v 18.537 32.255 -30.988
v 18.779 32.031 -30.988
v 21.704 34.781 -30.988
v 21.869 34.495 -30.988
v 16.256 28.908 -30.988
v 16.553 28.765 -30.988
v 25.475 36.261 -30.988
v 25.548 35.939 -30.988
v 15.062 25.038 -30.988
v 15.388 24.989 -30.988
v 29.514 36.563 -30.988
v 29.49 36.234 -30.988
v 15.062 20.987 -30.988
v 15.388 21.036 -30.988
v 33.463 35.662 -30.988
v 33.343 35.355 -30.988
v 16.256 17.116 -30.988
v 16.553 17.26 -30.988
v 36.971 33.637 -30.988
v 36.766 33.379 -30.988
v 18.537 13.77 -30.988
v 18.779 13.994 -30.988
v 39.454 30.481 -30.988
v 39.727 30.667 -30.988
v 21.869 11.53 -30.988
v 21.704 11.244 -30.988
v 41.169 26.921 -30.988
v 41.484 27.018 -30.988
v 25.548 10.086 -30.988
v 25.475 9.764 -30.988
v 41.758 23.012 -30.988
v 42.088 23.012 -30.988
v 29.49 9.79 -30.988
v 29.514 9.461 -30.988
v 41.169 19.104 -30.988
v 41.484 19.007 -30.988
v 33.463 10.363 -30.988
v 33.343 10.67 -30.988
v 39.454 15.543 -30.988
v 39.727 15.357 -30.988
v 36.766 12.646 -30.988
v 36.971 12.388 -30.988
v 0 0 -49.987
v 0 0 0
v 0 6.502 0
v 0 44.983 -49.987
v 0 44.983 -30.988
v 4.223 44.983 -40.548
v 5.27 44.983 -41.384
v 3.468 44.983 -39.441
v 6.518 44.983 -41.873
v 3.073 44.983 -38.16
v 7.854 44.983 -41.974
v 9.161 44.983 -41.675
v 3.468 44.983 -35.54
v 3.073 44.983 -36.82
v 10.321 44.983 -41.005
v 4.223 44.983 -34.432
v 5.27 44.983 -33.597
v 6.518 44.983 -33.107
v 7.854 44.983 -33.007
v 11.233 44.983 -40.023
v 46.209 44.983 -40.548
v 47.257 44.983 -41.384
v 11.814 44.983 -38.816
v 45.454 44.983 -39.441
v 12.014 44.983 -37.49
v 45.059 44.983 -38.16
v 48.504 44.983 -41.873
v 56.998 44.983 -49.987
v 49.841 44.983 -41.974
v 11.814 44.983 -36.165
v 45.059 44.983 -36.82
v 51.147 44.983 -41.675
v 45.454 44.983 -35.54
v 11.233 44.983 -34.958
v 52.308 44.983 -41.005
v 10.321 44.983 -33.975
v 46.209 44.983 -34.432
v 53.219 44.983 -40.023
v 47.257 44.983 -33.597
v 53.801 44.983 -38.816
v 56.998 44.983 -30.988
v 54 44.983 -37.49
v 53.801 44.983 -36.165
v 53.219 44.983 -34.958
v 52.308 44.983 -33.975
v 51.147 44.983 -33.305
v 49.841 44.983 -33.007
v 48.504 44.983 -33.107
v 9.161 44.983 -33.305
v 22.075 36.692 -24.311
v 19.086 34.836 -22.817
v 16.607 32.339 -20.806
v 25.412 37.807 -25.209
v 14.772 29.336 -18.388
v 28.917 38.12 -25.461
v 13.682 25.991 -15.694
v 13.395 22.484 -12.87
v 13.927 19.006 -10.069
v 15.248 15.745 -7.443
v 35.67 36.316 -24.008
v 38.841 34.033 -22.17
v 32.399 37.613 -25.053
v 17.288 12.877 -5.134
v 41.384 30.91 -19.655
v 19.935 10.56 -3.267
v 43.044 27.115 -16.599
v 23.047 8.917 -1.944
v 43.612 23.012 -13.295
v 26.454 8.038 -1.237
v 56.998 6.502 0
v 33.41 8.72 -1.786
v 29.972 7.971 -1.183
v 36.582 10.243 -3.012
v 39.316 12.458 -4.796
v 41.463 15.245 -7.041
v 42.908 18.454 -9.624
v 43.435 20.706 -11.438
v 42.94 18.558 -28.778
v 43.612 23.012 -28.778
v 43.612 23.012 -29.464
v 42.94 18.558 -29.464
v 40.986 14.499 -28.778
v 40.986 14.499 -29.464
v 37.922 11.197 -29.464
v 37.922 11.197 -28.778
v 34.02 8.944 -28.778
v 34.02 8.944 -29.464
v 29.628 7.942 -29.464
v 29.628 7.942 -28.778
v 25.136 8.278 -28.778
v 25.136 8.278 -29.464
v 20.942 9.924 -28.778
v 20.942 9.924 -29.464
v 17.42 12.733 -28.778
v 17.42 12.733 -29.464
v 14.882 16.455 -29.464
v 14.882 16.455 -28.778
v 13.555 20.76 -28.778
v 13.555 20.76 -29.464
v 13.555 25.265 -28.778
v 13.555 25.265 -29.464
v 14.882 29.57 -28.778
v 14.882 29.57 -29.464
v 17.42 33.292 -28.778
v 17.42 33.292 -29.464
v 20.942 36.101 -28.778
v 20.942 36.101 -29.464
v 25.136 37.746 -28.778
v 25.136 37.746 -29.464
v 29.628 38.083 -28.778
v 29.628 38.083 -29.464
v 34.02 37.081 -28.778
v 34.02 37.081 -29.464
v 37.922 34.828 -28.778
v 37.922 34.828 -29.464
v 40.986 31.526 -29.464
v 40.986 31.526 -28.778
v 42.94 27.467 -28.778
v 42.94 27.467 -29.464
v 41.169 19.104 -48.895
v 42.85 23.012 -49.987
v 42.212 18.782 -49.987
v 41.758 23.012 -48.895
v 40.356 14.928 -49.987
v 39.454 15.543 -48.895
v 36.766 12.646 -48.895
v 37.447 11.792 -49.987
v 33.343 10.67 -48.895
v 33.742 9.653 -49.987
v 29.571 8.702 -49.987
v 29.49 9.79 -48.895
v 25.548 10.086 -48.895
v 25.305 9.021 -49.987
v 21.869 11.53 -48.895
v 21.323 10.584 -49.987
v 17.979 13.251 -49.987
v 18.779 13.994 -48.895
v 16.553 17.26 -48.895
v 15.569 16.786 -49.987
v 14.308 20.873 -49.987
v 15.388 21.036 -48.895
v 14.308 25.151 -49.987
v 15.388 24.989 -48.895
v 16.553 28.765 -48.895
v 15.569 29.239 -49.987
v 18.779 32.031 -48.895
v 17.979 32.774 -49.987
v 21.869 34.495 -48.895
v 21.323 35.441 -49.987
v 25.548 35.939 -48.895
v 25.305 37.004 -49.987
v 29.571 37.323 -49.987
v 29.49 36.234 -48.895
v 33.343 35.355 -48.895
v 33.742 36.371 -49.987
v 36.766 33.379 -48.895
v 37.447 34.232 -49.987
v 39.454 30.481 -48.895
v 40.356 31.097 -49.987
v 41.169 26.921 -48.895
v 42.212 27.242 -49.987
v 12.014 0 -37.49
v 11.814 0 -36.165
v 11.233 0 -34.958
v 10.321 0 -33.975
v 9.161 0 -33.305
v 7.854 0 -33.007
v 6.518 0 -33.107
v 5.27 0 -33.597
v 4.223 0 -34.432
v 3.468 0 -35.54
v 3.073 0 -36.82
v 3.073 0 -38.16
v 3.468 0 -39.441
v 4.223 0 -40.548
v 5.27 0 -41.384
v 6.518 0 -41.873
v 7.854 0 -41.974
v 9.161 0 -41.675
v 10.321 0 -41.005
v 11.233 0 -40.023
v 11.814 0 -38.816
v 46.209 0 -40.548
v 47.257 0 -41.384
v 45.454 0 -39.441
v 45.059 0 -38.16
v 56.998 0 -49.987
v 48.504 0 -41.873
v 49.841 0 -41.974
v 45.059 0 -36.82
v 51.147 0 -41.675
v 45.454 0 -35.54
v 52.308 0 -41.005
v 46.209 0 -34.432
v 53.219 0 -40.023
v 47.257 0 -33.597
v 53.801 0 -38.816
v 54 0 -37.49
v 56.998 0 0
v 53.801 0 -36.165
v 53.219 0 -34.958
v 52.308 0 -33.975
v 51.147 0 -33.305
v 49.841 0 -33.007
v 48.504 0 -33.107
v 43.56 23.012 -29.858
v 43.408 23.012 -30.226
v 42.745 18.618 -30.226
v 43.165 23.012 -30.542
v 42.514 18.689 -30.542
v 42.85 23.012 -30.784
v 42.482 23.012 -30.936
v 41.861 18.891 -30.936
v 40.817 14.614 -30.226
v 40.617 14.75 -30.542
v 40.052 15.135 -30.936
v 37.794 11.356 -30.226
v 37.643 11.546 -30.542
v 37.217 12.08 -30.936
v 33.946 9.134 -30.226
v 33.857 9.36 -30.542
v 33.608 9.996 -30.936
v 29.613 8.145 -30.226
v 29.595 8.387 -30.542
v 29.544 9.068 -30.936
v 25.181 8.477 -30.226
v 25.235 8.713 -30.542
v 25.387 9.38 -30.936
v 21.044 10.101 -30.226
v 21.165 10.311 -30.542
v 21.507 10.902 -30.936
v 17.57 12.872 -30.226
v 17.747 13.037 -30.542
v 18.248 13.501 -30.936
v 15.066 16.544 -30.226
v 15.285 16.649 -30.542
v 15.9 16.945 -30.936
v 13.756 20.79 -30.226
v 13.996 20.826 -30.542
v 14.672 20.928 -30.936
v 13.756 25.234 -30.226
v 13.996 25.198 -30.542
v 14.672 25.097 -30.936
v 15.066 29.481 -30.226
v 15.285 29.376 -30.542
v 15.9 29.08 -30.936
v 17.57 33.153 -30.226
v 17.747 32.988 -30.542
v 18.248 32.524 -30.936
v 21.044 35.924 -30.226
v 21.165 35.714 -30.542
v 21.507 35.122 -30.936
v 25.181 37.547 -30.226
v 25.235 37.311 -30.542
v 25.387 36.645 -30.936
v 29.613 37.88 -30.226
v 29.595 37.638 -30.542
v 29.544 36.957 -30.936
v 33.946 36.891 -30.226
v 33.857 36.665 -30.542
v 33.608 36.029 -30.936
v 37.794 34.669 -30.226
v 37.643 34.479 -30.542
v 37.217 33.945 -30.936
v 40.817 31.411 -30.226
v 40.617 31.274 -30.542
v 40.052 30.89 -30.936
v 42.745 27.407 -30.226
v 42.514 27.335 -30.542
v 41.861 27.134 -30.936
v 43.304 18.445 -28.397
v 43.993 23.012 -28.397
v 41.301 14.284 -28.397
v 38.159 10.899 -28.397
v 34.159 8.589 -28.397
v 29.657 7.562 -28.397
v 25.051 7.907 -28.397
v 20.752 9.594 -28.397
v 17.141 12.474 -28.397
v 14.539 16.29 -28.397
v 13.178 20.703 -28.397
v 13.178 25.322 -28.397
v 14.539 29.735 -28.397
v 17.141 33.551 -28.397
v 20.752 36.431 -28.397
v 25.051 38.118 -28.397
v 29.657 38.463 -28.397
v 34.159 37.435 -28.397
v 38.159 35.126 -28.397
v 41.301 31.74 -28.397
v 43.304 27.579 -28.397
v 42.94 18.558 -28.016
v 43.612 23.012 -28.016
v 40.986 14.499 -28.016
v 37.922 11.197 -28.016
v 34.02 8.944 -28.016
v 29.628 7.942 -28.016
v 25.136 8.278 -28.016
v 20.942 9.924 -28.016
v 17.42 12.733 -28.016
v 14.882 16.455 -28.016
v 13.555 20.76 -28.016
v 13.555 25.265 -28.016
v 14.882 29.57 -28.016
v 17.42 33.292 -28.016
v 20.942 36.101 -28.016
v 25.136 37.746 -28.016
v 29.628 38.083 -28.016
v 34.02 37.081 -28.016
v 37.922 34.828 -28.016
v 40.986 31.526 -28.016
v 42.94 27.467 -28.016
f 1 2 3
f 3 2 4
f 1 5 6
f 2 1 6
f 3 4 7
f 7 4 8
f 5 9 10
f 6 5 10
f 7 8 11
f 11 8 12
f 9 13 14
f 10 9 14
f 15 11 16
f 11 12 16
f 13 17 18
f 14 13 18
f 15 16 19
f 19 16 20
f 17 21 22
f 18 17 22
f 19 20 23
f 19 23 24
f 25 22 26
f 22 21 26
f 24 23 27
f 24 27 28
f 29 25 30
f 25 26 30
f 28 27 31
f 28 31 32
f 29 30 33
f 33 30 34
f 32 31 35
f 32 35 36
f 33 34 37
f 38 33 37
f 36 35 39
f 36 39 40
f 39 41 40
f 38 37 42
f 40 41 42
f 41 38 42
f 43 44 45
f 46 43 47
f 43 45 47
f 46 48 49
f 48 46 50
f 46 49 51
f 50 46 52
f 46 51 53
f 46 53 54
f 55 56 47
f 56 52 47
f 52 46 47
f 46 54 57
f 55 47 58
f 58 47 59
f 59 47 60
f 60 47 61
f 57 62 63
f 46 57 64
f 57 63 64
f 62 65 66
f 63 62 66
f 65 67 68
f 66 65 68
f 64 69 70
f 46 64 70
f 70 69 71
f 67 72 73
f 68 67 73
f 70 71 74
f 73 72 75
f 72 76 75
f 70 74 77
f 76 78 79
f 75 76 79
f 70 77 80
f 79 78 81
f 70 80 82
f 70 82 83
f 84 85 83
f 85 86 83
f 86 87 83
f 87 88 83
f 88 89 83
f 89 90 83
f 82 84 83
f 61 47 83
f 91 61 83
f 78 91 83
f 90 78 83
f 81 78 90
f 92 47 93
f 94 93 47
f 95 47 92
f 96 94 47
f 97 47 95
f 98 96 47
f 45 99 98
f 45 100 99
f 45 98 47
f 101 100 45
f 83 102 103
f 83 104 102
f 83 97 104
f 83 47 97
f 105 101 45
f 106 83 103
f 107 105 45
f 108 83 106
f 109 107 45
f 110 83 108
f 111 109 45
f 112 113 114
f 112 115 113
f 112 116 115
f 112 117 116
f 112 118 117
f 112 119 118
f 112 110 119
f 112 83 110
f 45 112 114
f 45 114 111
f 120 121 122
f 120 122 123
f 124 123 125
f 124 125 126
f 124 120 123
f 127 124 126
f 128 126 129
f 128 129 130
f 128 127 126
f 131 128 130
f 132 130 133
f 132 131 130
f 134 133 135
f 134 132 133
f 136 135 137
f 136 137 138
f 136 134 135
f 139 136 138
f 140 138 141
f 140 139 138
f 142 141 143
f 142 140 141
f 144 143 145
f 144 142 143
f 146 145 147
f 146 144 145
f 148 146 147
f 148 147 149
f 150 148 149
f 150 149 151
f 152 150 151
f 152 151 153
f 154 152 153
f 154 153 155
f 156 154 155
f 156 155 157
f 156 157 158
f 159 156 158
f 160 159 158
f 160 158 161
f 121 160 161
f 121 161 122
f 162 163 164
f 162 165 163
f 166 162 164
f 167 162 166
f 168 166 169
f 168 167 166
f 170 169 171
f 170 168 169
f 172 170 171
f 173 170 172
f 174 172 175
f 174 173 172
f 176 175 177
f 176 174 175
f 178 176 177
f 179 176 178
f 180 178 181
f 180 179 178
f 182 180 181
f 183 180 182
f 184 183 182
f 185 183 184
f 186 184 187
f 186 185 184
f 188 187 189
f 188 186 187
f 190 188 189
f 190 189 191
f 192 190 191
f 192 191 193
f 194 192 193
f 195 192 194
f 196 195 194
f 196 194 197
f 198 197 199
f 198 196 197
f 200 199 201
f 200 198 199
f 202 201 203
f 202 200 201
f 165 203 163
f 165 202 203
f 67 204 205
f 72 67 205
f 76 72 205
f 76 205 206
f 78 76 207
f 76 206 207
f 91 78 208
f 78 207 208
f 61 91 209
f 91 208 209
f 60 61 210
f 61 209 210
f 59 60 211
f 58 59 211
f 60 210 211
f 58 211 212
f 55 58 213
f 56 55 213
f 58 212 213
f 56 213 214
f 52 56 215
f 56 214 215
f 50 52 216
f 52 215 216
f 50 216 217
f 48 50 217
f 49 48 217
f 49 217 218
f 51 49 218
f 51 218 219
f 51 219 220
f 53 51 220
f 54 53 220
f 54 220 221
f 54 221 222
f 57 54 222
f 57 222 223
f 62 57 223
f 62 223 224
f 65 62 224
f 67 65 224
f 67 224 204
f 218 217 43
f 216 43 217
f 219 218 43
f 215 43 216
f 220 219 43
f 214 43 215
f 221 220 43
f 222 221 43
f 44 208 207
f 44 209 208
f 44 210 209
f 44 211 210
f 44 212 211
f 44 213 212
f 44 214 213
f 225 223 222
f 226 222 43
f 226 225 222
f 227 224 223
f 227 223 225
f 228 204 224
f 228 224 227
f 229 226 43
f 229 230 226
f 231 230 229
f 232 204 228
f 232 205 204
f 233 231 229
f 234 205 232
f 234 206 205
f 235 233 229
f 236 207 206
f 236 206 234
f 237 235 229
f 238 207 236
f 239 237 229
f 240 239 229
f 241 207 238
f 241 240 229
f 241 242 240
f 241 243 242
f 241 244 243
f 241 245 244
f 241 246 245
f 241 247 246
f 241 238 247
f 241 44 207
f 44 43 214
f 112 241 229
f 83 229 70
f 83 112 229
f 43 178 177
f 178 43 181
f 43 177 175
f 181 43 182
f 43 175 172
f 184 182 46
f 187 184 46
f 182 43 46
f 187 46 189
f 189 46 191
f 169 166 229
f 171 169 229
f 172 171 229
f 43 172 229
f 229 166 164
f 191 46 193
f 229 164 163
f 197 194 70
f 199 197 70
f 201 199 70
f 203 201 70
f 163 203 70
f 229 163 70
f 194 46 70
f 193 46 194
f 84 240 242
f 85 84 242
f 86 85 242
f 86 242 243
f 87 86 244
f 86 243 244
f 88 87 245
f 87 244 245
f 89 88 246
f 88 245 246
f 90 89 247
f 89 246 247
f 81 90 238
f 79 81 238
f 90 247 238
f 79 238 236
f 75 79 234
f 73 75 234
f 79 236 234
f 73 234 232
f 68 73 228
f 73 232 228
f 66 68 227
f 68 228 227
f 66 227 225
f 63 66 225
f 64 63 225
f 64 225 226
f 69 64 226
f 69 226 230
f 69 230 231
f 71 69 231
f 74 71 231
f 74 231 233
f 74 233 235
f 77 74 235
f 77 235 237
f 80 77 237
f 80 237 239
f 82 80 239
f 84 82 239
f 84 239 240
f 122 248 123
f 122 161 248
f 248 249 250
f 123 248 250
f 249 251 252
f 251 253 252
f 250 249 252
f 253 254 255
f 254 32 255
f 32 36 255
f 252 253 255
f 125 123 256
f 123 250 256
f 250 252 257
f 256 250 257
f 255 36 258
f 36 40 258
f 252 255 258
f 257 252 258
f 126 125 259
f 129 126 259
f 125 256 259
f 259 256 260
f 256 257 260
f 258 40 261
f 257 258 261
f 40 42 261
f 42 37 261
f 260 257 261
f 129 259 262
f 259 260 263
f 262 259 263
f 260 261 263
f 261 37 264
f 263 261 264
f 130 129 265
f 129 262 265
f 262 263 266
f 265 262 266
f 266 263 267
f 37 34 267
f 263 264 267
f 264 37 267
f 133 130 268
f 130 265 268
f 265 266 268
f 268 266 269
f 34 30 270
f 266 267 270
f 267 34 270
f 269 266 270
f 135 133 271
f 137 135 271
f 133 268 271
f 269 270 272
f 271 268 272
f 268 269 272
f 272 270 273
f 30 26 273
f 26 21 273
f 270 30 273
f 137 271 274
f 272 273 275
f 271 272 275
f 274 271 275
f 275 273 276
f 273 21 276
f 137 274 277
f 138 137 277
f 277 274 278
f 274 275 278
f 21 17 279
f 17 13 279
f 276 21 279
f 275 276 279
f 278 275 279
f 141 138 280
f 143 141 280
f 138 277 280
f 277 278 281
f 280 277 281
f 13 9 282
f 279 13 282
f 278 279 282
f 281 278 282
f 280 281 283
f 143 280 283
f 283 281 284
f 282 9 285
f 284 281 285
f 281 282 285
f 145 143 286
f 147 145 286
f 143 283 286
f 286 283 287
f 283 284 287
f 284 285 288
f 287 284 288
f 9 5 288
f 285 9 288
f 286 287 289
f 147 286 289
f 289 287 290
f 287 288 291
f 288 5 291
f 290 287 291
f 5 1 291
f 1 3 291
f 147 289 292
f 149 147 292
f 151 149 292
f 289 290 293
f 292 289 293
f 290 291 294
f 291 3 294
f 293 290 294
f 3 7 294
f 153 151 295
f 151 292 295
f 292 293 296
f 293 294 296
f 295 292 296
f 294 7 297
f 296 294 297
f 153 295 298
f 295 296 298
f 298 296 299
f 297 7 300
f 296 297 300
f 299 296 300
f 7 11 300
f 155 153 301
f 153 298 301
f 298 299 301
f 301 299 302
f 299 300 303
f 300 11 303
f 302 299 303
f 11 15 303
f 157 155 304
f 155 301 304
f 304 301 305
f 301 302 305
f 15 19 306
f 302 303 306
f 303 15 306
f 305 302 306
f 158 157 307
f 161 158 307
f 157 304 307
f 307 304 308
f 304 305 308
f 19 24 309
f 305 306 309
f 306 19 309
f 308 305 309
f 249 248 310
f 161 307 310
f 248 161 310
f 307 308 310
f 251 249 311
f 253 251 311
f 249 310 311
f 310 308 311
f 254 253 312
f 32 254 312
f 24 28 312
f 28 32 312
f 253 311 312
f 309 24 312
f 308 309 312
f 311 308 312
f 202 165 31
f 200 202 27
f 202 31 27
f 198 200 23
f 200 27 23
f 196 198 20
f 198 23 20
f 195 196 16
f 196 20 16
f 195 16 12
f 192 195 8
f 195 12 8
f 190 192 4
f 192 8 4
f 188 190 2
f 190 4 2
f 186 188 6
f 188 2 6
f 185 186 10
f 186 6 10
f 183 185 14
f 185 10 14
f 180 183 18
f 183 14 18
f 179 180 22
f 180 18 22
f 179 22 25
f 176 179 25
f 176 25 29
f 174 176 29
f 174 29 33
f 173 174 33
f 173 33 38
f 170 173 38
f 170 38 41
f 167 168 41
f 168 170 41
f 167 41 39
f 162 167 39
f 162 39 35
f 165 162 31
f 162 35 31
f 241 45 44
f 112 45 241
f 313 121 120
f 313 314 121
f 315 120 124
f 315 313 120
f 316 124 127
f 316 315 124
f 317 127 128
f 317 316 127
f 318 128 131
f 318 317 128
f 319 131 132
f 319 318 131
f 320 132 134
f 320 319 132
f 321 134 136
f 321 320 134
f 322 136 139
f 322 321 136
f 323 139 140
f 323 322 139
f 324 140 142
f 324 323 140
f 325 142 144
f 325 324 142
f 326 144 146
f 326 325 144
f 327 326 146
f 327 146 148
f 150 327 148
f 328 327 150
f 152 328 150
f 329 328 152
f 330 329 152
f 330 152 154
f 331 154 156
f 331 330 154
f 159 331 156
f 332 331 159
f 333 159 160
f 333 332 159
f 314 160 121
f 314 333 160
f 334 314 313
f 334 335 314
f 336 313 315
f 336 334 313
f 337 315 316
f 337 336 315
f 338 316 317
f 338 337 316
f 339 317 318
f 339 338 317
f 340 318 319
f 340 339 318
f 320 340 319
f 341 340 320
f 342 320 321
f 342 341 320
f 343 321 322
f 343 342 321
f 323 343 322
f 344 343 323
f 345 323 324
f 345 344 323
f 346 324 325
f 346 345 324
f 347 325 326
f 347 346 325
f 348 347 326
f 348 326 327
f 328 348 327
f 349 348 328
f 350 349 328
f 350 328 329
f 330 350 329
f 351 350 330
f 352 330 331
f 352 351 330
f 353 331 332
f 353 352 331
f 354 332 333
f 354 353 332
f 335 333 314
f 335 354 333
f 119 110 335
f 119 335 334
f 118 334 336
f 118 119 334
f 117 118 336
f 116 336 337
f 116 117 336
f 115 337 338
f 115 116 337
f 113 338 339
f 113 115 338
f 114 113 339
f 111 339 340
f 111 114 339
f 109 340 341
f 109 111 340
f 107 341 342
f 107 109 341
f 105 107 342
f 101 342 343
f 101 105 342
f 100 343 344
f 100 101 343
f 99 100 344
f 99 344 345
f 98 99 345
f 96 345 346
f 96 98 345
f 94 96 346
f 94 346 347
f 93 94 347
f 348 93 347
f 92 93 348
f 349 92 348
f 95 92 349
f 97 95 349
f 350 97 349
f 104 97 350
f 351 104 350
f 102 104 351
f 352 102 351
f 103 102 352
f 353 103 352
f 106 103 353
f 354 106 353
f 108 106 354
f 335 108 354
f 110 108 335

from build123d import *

# Parameters (mm, degrees)
SKETCH1_W          = 56.9976
SKETCH1_H          = 44.9834
SKETCH1_R          = 13.259
EXTRUDE1_DEPTH     = 49.9872
CUT_EXTRUDE1_DEPTH = 57.9976
SKETCH3_R          = 15.113
CUT_EXTRUDE2_DEPTH = 30.988
FILLET1_R          = 1.524
HOLE1_D            = 8.9916
HOLE1_DEPTH        = 44.9834


with BuildPart() as part:
    # Sketch1 → Extrude1 (new body)
    with BuildSketch(Plane.XY):
        with Locations((28.4988, 22.4917)):
            Rectangle(SKETCH1_W, SKETCH1_H)
        with Locations((28.4988, 23.0124)):
            Circle(SKETCH1_R, mode=Mode.SUBTRACT)
    extrude(amount=-EXTRUDE1_DEPTH)

    # Sketch2 → Cut-Extrude1 (cut, through all)
    with BuildSketch(Plane(origin=(56.9976, 0, 0), x_dir=(0, 0, -1), z_dir=(1, 0, 0))):
        Polygon((0, 44.9834), (30.988, 44.9834), (0, 6.5024), align=None)
    extrude(amount=-CUT_EXTRUDE1_DEPTH, mode=Mode.SUBTRACT)

    # Sketch3 → Cut-Extrude2 (cut)
    with BuildSketch(Plane(origin=(0, 0, 0), x_dir=(-1, 0, 0), z_dir=(0, 0, -1))):
        with Locations(Location((-28.4988, 23.0124, 0), (0, 0, 180))):  # turned: the seam where the file's is
            Circle(SKETCH3_R)
    extrude(amount=CUT_EXTRUDE2_DEPTH, mode=Mode.SUBTRACT)

    # Fillet1
    fillet1_edges = [part.edges().sort_by_distance(p)[0] for p in [
        (13.3858, 23.0124, -30.988),
    ]]
    fillet(fillet1_edges, radius=FILLET1_R)

    # Hole1
    with Locations(Plane(origin=(0, 44.9834, 0), x_dir=(-1, 0, 0), z_dir=(0, 1, 0))):
        with Locations((-7.5184, -37.4904), (-49.5046, -37.4904)):
            Hole(HOLE1_D / 2, depth=HOLE1_DEPTH)

    # Sketch6 → Cut-Revolve1 (revolve, cut)
    with BuildSketch(Plane(origin=(0, 23.0124, 0), x_dir=(-1, 0, 0), z_dir=(0, 1, 0)), mode=Mode.PRIVATE) as cut_revolve1_sk:
        Polygon((-13.3858, -28.0162), (-13.3858, -28.7782), (-13.0048, -28.3972), align=None)
        Polygon((-15.2398, -48.8952), (-15.2398, -49.9872), (-14.1478, -49.9872), align=None)
    revolve(cut_revolve1_sk.sketch.rotate(Axis((28.4988, 23.0124, 17.508123997), (0, 0, -1)), 180), axis=Axis((28.4988, 23.0124, 17.508123997), (0, 0, -1)), mode=Mode.SUBTRACT)  # turned: the seam where the file's is


solid = part.part
